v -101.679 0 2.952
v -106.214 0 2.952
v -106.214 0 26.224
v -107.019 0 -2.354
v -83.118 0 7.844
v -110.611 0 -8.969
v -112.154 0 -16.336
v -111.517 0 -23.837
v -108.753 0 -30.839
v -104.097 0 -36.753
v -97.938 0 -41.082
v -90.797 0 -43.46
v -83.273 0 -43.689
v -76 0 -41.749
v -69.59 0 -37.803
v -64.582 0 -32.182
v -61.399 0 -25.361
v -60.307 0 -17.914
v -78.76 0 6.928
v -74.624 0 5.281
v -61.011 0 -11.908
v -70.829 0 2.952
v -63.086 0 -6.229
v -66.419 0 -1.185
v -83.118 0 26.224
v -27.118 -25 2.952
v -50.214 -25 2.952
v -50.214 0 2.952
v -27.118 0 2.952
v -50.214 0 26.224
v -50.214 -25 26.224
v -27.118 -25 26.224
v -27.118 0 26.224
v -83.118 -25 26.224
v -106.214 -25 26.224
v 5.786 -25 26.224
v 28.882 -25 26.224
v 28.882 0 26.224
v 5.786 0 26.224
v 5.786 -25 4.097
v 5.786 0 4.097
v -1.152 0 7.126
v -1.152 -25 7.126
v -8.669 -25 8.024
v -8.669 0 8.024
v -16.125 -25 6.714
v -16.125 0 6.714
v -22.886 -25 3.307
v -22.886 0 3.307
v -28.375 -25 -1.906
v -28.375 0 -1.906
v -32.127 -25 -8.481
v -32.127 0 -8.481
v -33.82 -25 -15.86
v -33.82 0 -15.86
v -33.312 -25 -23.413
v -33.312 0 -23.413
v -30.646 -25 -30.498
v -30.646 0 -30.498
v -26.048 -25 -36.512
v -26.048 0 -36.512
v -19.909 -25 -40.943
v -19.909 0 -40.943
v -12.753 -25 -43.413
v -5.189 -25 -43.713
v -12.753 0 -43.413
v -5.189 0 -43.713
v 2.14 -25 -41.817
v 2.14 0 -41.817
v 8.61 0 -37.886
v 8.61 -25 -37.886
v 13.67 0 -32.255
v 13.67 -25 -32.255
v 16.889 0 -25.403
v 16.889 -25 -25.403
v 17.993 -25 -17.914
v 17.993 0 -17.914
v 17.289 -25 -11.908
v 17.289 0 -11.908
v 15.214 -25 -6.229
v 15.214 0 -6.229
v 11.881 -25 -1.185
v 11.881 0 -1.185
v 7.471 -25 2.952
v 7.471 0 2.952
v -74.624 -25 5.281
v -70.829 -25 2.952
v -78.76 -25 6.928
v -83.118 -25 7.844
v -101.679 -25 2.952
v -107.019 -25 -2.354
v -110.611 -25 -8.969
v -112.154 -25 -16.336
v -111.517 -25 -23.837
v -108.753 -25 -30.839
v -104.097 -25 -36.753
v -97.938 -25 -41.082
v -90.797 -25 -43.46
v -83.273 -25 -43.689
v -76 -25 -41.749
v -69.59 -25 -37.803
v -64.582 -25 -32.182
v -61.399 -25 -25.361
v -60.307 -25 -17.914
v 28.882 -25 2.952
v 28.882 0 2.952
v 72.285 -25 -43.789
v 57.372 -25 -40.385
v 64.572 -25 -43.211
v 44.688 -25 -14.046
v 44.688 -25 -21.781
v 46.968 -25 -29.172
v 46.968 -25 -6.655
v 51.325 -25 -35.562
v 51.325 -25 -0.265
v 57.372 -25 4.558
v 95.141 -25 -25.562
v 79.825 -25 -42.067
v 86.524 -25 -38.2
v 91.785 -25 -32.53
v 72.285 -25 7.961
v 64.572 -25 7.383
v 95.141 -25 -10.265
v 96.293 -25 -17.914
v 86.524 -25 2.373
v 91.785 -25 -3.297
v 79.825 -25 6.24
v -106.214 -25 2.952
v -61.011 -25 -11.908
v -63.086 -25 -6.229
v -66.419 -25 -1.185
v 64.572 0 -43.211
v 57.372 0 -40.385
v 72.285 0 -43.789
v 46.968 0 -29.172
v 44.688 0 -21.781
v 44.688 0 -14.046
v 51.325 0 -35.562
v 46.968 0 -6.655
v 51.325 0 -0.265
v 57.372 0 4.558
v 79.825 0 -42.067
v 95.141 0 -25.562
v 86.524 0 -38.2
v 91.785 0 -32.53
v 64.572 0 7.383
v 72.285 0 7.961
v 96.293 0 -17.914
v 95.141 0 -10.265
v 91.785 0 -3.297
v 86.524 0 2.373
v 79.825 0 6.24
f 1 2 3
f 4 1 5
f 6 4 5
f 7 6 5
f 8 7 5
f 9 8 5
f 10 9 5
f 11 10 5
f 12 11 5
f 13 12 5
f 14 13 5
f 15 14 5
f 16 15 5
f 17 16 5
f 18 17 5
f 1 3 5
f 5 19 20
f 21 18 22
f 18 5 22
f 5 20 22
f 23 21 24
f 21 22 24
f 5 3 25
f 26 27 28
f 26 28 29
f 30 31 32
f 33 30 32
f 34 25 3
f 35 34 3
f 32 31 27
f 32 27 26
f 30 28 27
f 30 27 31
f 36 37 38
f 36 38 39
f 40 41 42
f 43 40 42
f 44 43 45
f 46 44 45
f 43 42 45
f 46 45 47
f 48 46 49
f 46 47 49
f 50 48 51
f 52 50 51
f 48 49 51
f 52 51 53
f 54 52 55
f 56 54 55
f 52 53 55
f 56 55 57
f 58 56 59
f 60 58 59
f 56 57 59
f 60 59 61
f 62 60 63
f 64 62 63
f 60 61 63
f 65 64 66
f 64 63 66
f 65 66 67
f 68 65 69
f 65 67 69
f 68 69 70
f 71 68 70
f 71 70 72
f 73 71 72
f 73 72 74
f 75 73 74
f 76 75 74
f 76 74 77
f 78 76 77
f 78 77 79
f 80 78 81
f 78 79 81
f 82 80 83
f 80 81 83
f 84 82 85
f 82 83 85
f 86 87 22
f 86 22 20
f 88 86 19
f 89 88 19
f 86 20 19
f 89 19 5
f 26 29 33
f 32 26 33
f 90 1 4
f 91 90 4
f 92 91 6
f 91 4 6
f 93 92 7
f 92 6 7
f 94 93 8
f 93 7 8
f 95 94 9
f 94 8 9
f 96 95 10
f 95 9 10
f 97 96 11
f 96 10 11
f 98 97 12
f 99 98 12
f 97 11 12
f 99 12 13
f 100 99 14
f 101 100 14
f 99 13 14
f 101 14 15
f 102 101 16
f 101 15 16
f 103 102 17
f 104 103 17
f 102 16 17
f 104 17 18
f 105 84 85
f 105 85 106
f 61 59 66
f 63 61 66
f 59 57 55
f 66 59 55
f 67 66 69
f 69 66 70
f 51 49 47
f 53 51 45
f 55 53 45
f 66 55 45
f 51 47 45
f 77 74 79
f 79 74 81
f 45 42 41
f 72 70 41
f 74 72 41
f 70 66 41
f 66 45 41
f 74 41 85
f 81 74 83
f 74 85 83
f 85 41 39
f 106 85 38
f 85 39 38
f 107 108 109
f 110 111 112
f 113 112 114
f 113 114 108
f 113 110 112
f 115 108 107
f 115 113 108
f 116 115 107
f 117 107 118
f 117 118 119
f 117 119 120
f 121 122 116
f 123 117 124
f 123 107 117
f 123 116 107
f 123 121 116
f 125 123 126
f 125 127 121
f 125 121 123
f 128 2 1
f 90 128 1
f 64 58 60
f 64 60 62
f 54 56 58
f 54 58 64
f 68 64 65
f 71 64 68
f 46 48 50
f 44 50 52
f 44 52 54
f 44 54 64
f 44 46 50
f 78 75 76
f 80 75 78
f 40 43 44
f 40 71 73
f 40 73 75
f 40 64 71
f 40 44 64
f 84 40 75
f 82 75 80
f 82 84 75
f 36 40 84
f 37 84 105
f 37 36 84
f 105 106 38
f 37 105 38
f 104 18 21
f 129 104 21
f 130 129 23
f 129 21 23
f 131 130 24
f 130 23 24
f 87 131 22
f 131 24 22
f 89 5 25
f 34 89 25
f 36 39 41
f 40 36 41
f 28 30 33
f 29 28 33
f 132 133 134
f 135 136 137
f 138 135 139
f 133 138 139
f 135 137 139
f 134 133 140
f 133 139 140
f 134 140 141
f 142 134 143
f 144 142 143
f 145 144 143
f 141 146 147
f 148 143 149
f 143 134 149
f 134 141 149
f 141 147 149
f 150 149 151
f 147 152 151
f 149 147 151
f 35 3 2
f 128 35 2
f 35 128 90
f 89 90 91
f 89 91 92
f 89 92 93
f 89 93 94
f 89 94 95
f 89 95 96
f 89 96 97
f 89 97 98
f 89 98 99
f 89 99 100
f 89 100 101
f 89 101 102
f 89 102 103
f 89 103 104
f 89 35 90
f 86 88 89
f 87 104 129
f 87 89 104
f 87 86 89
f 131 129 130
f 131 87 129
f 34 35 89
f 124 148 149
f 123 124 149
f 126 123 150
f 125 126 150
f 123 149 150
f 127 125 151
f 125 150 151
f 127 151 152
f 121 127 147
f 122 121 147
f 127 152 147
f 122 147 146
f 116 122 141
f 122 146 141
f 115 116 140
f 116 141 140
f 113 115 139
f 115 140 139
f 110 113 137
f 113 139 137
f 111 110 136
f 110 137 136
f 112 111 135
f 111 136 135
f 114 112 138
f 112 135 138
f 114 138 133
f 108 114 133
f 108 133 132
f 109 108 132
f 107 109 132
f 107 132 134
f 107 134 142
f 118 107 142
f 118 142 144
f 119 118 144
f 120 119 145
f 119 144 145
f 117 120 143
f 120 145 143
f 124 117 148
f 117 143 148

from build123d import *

# Parameters (mm, degrees)
F3_DEPTH = 25
F2_W     = 23.0961740017
F2_H     = 23.2721955981
F2_R     = 25.9475596249


with BuildPart() as f3:
    # F2 (on Front) → F3 (new body)
    with BuildSketch(Plane.XZ):
        with BuildLine():
            Line((5.7860950828, 4.0973043387), (5.7860950828, 2.9515197966))
            Line((5.7860950828, 2.9515197966), (7.4705263631, 2.9515197966))
            ThreePointArc((7.4705263631, 2.9515197966), (6.6395597449, 3.5409493867), (5.7860950828, 4.0973043387))
        make_face()
        with BuildLine():
            Line((7.4705263631, 2.9515197966), (5.7860950828, 2.9515197966))
            Line((5.7860950828, 2.9515197966), (5.7860950828, 4.0973043387))
            ThreePointArc((5.7860950828, 4.0973043387), (-20.5389101587, 4.7778779449), (-33.9018061578, -17.9135762155))
            ThreePointArc((-33.9018061578, -17.9135762155), (-7.9542465329, -43.8611358404), (17.993313092, -17.9135762155))
            ThreePointArc((17.993313092, -17.9135762155), (15.2137385425, -6.2293852707), (7.4705263631, 2.9515197966))
        make_face()
        with BuildLine():
            ThreePointArc((5.7860950828, 4.0973043387), (6.6395597449, 3.5409493867), (7.4705263631, 2.9515197966))
            Line((7.4705263631, 2.9515197966), (28.8822690845, 2.9515197966))
            Line((28.8822690845, 2.9515197966), (28.8822690845, 26.2237153947))
            Line((28.8822690845, 26.2237153947), (5.7860950828, 26.2237153947))
            Line((5.7860950828, 26.2237153947), (5.7860950828, 4.0973043387))
        make_face()
    extrude(amount=F3_DEPTH)


with BuildPart() as f3b:
    # F2 (on Front) → F3, piece 2 (new body)
    with BuildSketch(Plane.XZ):
        with Locations((-38.6658179164, 14.5876175957)):
            Rectangle(F2_W, F2_H)
    extrude(amount=F3_DEPTH)


with BuildPart() as f3c:
    # F2 (on Front) → F3, piece 3 (new body)
    with BuildSketch(Plane.XZ):
        with BuildLine():
            ThreePointArc((-101.6790194289, 2.9515197966), (-97.9384374777, -41.0815612909), (-60.306686908, -17.9135762155))
            ThreePointArc((-60.306686908, -17.9135762155), (-63.0862614575, -6.2293852707), (-70.8294736369, 2.9515197966))
            Line((-70.8294736369, 2.9515197966), (-83.1177309155, 2.9515197966))
            Line((-83.1177309155, 2.9515197966), (-101.6790194289, 2.9515197966))
        make_face()
        with BuildLine():
            Line((-83.1177309155, 2.9515197966), (-70.8294736369, 2.9515197966))
            ThreePointArc((-70.8294736369, 2.9515197966), (-76.6566554499, 6.1937275718), (-83.1177309155, 7.8437163493))
            Line((-83.1177309155, 7.8437163493), (-83.1177309155, 2.9515197966))
        make_face()
        with BuildLine():
            Line((-106.2139049172, 2.9515197966), (-101.6790194289, 2.9515197966))
            ThreePointArc((-101.6790194289, 2.9515197966), (-92.8673935534, 7.1771020729), (-83.1177309155, 7.8437163493))
            Line((-83.1177309155, 7.8437163493), (-83.1177309155, 26.2237153947))
            Line((-83.1177309155, 26.2237153947), (-106.2139049172, 26.2237153947))
            Line((-106.2139049172, 26.2237153947), (-106.2139049172, 2.9515197966))
        make_face()
        with BuildLine():
            ThreePointArc((-83.1177309155, 7.8437163493), (-92.8673935534, 7.1771020729), (-101.6790194289, 2.9515197966))
            Line((-101.6790194289, 2.9515197966), (-83.1177309155, 2.9515197966))
            Line((-83.1177309155, 2.9515197966), (-83.1177309155, 7.8437163493))
        make_face()
    extrude(amount=F3_DEPTH)


with BuildPart() as f3d:
    # F2 (on Front) → F3, piece 4 (new body)
    with BuildSketch(Plane.XZ):
        with Locations((70.3457534671, -17.9135762155)):
            Circle(F2_R)
    extrude(amount=F3_DEPTH)


solid = Compound([f3.part, f3b.part, f3c.part, f3d.part])
